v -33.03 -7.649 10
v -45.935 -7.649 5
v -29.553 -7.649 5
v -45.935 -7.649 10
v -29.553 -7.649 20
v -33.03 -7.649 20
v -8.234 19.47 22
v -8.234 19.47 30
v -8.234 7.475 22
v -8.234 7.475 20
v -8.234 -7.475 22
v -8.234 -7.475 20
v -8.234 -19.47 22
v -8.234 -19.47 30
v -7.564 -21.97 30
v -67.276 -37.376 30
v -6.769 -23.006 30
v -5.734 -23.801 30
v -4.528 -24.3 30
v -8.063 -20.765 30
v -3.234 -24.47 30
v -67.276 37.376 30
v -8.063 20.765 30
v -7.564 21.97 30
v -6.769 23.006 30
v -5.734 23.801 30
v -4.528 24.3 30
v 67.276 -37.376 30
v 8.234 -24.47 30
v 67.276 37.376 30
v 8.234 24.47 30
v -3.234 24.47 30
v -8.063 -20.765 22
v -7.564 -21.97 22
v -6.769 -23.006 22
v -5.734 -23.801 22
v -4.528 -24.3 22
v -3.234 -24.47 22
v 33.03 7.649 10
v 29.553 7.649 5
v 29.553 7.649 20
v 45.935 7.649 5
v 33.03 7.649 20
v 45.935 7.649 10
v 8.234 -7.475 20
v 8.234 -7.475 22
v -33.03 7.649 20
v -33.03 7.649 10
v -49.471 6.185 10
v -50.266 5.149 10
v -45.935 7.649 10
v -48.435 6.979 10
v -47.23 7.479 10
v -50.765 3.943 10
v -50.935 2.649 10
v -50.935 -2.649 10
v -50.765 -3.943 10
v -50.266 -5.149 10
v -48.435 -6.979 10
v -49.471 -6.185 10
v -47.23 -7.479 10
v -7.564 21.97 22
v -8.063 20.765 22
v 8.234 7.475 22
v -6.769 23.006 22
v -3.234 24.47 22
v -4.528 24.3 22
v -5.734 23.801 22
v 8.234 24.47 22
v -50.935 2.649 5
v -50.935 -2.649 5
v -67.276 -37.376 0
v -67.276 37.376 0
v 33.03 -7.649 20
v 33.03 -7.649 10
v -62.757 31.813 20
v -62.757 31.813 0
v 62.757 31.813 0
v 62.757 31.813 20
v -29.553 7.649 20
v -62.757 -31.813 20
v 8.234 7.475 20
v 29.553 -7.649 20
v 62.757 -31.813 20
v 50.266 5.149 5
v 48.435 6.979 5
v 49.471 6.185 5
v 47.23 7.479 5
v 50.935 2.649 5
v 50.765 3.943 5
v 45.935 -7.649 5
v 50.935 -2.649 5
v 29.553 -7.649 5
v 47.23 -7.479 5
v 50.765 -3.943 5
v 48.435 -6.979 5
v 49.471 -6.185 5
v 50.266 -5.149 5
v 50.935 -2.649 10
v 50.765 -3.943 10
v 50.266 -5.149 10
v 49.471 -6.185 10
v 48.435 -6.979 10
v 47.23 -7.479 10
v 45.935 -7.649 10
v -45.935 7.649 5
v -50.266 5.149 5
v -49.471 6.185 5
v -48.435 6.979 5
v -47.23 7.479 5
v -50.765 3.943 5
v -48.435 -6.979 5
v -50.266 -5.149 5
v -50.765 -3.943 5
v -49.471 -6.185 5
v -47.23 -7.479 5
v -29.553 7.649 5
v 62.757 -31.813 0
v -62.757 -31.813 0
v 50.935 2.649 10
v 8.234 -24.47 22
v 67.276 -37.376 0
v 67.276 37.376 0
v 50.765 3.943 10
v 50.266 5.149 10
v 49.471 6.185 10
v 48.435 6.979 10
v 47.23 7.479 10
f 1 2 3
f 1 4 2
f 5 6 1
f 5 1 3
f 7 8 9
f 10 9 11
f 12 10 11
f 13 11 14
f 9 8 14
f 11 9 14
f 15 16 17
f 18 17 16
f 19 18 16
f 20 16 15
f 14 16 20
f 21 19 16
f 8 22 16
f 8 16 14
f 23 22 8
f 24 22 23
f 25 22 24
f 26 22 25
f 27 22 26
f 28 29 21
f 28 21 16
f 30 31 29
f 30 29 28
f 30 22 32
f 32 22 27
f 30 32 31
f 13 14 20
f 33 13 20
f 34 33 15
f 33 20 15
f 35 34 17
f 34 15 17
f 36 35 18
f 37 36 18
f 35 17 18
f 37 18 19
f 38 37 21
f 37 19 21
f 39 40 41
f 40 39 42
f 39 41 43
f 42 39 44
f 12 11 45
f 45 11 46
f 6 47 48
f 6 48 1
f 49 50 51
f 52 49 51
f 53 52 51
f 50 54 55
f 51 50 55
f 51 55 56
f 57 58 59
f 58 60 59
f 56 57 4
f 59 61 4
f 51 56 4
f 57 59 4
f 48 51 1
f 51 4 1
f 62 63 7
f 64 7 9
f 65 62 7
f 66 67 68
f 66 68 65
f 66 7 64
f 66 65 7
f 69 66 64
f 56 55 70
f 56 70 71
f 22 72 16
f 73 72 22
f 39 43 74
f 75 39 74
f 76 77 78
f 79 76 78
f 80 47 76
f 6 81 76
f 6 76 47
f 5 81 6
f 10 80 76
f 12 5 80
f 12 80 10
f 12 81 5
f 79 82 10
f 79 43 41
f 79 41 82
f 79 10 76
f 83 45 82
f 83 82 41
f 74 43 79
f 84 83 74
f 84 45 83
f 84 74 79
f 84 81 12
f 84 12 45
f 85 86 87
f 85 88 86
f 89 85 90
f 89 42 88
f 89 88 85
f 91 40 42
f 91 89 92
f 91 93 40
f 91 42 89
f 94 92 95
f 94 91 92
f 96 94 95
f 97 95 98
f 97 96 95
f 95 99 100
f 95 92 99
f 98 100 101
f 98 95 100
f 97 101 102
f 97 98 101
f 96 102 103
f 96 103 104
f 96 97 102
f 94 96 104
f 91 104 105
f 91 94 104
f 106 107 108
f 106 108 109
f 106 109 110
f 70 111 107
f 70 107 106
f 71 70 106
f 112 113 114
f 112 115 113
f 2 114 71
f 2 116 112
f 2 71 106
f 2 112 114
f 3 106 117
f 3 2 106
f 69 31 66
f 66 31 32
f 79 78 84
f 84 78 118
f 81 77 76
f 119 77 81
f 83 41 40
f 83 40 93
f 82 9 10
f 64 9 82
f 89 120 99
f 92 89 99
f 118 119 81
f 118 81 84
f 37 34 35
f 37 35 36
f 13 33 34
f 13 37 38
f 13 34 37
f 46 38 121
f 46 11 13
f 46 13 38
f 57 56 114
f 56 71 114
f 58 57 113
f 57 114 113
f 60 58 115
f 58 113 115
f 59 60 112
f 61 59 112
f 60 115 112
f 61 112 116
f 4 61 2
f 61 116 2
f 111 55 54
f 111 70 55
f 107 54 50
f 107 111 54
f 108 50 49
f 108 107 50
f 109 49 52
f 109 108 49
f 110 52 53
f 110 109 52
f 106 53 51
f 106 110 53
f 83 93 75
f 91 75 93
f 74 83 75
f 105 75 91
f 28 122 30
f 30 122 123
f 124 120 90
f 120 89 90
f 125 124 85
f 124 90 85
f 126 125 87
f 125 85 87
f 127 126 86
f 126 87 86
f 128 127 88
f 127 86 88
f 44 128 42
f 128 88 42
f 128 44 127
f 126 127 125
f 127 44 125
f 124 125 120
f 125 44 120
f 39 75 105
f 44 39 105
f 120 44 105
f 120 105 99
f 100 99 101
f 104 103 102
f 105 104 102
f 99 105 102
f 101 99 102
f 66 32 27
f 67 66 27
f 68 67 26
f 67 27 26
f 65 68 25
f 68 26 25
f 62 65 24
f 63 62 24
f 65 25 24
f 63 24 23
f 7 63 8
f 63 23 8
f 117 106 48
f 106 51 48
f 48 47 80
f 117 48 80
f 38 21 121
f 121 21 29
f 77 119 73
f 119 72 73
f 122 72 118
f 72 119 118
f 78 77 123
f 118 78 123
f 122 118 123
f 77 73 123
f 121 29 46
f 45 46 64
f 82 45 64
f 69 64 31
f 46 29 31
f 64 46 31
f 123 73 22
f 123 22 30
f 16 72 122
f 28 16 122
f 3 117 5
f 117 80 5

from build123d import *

# Parameters (mm, degrees)
F0_W      = 134.552986
F0_H      = 74.75166
F1_DEPTH  = 30
F3_DEPTH  = 8
F4_W      = 125.513256
F4_H      = 63.625834
F5_DEPTH  = 20
F6_W      = 16.467378
F6_H      = 14.950332
F7_DEPTH  = 2
F8_W      = 3.476821
F8_H      = 15.298014
F9_DEPTH  = 10
F10_W     = 21.382451
F10_H     = 15.298014
F11_DEPTH = 5
F12_R     = 5


with BuildPart() as f1:
    # F0 (on Top) → F1 (new body)
    with BuildSketch(Plane.XY):
        Rectangle(F0_W, F0_H)
    extrude(amount=F1_DEPTH)

    # F2 (on face) → F3 (cut)
    with BuildSketch(Plane.XY.offset(30)):
        with BuildLine():
            Line((8.233689, -24.47048), (8.233689, 24.47048))
            Line((8.233689, 24.47048), (-3.233689, 24.47048))
            ThreePointArc((-3.233689, 24.47048), (-6.769223, 23.006014), (-8.233689, 19.47048))
            Line((-8.233689, 19.47048), (-8.233689, -19.47048))
            ThreePointArc((-8.233689, -19.47048), (-6.769223, -23.006014), (-3.233689, -24.47048))
            Line((-3.233689, -24.47048), (8.233689, -24.47048))
        make_face()
    extrude(amount=-F3_DEPTH, mode=Mode.SUBTRACT)

    # F4 (on face) → F5 (cut)
    with BuildSketch(Plane(origin=(0, 0, 0), x_dir=(1, 0, 0), z_dir=(0, 0, -1))):
        Rectangle(F4_W, F4_H)
    extrude(amount=-F5_DEPTH, mode=Mode.SUBTRACT)

    # F6 (on face) → F7 (cut, through all)
    with BuildSketch(Plane.XY.offset(22)):
        Rectangle(F6_W, F6_H)
    extrude(amount=-F7_DEPTH, mode=Mode.SUBTRACT)

    # F8 (on face) → F9 (join)
    with BuildSketch(Plane(origin=(0, 0, 20), x_dir=(1, 0, 0), z_dir=(0, 0, -1))):
        with Locations((-31.291391, 0)):
            Rectangle(F8_W, F8_H)
        with Locations((31.291391, 0)):
            Rectangle(F8_W, F8_H)
    extrude(amount=F9_DEPTH)

    # F10 (on face) → F11 (join)
    with BuildSketch(Plane(origin=(0, 0, 10), x_dir=(1, 0, 0), z_dir=(0, 0, -1))):
        with Locations((-40.244206, 0)):
            Rectangle(F10_W, F10_H)
        with Locations((40.244206, 0)):
            Rectangle(F10_W, F10_H)
    extrude(amount=F11_DEPTH)

    # F12
    f12_edges = [f1.edges().sort_by_distance(p)[0] for p in [
        (-50.935432, -7.649007, 7.5),
        (-50.935432, 7.649007, 7.5),
        (50.935432, 7.649007, 7.5),
        (50.935432, -7.649007, 7.5),
    ]]
    fillet(f12_edges, radius=F12_R)


solid = f1.part
